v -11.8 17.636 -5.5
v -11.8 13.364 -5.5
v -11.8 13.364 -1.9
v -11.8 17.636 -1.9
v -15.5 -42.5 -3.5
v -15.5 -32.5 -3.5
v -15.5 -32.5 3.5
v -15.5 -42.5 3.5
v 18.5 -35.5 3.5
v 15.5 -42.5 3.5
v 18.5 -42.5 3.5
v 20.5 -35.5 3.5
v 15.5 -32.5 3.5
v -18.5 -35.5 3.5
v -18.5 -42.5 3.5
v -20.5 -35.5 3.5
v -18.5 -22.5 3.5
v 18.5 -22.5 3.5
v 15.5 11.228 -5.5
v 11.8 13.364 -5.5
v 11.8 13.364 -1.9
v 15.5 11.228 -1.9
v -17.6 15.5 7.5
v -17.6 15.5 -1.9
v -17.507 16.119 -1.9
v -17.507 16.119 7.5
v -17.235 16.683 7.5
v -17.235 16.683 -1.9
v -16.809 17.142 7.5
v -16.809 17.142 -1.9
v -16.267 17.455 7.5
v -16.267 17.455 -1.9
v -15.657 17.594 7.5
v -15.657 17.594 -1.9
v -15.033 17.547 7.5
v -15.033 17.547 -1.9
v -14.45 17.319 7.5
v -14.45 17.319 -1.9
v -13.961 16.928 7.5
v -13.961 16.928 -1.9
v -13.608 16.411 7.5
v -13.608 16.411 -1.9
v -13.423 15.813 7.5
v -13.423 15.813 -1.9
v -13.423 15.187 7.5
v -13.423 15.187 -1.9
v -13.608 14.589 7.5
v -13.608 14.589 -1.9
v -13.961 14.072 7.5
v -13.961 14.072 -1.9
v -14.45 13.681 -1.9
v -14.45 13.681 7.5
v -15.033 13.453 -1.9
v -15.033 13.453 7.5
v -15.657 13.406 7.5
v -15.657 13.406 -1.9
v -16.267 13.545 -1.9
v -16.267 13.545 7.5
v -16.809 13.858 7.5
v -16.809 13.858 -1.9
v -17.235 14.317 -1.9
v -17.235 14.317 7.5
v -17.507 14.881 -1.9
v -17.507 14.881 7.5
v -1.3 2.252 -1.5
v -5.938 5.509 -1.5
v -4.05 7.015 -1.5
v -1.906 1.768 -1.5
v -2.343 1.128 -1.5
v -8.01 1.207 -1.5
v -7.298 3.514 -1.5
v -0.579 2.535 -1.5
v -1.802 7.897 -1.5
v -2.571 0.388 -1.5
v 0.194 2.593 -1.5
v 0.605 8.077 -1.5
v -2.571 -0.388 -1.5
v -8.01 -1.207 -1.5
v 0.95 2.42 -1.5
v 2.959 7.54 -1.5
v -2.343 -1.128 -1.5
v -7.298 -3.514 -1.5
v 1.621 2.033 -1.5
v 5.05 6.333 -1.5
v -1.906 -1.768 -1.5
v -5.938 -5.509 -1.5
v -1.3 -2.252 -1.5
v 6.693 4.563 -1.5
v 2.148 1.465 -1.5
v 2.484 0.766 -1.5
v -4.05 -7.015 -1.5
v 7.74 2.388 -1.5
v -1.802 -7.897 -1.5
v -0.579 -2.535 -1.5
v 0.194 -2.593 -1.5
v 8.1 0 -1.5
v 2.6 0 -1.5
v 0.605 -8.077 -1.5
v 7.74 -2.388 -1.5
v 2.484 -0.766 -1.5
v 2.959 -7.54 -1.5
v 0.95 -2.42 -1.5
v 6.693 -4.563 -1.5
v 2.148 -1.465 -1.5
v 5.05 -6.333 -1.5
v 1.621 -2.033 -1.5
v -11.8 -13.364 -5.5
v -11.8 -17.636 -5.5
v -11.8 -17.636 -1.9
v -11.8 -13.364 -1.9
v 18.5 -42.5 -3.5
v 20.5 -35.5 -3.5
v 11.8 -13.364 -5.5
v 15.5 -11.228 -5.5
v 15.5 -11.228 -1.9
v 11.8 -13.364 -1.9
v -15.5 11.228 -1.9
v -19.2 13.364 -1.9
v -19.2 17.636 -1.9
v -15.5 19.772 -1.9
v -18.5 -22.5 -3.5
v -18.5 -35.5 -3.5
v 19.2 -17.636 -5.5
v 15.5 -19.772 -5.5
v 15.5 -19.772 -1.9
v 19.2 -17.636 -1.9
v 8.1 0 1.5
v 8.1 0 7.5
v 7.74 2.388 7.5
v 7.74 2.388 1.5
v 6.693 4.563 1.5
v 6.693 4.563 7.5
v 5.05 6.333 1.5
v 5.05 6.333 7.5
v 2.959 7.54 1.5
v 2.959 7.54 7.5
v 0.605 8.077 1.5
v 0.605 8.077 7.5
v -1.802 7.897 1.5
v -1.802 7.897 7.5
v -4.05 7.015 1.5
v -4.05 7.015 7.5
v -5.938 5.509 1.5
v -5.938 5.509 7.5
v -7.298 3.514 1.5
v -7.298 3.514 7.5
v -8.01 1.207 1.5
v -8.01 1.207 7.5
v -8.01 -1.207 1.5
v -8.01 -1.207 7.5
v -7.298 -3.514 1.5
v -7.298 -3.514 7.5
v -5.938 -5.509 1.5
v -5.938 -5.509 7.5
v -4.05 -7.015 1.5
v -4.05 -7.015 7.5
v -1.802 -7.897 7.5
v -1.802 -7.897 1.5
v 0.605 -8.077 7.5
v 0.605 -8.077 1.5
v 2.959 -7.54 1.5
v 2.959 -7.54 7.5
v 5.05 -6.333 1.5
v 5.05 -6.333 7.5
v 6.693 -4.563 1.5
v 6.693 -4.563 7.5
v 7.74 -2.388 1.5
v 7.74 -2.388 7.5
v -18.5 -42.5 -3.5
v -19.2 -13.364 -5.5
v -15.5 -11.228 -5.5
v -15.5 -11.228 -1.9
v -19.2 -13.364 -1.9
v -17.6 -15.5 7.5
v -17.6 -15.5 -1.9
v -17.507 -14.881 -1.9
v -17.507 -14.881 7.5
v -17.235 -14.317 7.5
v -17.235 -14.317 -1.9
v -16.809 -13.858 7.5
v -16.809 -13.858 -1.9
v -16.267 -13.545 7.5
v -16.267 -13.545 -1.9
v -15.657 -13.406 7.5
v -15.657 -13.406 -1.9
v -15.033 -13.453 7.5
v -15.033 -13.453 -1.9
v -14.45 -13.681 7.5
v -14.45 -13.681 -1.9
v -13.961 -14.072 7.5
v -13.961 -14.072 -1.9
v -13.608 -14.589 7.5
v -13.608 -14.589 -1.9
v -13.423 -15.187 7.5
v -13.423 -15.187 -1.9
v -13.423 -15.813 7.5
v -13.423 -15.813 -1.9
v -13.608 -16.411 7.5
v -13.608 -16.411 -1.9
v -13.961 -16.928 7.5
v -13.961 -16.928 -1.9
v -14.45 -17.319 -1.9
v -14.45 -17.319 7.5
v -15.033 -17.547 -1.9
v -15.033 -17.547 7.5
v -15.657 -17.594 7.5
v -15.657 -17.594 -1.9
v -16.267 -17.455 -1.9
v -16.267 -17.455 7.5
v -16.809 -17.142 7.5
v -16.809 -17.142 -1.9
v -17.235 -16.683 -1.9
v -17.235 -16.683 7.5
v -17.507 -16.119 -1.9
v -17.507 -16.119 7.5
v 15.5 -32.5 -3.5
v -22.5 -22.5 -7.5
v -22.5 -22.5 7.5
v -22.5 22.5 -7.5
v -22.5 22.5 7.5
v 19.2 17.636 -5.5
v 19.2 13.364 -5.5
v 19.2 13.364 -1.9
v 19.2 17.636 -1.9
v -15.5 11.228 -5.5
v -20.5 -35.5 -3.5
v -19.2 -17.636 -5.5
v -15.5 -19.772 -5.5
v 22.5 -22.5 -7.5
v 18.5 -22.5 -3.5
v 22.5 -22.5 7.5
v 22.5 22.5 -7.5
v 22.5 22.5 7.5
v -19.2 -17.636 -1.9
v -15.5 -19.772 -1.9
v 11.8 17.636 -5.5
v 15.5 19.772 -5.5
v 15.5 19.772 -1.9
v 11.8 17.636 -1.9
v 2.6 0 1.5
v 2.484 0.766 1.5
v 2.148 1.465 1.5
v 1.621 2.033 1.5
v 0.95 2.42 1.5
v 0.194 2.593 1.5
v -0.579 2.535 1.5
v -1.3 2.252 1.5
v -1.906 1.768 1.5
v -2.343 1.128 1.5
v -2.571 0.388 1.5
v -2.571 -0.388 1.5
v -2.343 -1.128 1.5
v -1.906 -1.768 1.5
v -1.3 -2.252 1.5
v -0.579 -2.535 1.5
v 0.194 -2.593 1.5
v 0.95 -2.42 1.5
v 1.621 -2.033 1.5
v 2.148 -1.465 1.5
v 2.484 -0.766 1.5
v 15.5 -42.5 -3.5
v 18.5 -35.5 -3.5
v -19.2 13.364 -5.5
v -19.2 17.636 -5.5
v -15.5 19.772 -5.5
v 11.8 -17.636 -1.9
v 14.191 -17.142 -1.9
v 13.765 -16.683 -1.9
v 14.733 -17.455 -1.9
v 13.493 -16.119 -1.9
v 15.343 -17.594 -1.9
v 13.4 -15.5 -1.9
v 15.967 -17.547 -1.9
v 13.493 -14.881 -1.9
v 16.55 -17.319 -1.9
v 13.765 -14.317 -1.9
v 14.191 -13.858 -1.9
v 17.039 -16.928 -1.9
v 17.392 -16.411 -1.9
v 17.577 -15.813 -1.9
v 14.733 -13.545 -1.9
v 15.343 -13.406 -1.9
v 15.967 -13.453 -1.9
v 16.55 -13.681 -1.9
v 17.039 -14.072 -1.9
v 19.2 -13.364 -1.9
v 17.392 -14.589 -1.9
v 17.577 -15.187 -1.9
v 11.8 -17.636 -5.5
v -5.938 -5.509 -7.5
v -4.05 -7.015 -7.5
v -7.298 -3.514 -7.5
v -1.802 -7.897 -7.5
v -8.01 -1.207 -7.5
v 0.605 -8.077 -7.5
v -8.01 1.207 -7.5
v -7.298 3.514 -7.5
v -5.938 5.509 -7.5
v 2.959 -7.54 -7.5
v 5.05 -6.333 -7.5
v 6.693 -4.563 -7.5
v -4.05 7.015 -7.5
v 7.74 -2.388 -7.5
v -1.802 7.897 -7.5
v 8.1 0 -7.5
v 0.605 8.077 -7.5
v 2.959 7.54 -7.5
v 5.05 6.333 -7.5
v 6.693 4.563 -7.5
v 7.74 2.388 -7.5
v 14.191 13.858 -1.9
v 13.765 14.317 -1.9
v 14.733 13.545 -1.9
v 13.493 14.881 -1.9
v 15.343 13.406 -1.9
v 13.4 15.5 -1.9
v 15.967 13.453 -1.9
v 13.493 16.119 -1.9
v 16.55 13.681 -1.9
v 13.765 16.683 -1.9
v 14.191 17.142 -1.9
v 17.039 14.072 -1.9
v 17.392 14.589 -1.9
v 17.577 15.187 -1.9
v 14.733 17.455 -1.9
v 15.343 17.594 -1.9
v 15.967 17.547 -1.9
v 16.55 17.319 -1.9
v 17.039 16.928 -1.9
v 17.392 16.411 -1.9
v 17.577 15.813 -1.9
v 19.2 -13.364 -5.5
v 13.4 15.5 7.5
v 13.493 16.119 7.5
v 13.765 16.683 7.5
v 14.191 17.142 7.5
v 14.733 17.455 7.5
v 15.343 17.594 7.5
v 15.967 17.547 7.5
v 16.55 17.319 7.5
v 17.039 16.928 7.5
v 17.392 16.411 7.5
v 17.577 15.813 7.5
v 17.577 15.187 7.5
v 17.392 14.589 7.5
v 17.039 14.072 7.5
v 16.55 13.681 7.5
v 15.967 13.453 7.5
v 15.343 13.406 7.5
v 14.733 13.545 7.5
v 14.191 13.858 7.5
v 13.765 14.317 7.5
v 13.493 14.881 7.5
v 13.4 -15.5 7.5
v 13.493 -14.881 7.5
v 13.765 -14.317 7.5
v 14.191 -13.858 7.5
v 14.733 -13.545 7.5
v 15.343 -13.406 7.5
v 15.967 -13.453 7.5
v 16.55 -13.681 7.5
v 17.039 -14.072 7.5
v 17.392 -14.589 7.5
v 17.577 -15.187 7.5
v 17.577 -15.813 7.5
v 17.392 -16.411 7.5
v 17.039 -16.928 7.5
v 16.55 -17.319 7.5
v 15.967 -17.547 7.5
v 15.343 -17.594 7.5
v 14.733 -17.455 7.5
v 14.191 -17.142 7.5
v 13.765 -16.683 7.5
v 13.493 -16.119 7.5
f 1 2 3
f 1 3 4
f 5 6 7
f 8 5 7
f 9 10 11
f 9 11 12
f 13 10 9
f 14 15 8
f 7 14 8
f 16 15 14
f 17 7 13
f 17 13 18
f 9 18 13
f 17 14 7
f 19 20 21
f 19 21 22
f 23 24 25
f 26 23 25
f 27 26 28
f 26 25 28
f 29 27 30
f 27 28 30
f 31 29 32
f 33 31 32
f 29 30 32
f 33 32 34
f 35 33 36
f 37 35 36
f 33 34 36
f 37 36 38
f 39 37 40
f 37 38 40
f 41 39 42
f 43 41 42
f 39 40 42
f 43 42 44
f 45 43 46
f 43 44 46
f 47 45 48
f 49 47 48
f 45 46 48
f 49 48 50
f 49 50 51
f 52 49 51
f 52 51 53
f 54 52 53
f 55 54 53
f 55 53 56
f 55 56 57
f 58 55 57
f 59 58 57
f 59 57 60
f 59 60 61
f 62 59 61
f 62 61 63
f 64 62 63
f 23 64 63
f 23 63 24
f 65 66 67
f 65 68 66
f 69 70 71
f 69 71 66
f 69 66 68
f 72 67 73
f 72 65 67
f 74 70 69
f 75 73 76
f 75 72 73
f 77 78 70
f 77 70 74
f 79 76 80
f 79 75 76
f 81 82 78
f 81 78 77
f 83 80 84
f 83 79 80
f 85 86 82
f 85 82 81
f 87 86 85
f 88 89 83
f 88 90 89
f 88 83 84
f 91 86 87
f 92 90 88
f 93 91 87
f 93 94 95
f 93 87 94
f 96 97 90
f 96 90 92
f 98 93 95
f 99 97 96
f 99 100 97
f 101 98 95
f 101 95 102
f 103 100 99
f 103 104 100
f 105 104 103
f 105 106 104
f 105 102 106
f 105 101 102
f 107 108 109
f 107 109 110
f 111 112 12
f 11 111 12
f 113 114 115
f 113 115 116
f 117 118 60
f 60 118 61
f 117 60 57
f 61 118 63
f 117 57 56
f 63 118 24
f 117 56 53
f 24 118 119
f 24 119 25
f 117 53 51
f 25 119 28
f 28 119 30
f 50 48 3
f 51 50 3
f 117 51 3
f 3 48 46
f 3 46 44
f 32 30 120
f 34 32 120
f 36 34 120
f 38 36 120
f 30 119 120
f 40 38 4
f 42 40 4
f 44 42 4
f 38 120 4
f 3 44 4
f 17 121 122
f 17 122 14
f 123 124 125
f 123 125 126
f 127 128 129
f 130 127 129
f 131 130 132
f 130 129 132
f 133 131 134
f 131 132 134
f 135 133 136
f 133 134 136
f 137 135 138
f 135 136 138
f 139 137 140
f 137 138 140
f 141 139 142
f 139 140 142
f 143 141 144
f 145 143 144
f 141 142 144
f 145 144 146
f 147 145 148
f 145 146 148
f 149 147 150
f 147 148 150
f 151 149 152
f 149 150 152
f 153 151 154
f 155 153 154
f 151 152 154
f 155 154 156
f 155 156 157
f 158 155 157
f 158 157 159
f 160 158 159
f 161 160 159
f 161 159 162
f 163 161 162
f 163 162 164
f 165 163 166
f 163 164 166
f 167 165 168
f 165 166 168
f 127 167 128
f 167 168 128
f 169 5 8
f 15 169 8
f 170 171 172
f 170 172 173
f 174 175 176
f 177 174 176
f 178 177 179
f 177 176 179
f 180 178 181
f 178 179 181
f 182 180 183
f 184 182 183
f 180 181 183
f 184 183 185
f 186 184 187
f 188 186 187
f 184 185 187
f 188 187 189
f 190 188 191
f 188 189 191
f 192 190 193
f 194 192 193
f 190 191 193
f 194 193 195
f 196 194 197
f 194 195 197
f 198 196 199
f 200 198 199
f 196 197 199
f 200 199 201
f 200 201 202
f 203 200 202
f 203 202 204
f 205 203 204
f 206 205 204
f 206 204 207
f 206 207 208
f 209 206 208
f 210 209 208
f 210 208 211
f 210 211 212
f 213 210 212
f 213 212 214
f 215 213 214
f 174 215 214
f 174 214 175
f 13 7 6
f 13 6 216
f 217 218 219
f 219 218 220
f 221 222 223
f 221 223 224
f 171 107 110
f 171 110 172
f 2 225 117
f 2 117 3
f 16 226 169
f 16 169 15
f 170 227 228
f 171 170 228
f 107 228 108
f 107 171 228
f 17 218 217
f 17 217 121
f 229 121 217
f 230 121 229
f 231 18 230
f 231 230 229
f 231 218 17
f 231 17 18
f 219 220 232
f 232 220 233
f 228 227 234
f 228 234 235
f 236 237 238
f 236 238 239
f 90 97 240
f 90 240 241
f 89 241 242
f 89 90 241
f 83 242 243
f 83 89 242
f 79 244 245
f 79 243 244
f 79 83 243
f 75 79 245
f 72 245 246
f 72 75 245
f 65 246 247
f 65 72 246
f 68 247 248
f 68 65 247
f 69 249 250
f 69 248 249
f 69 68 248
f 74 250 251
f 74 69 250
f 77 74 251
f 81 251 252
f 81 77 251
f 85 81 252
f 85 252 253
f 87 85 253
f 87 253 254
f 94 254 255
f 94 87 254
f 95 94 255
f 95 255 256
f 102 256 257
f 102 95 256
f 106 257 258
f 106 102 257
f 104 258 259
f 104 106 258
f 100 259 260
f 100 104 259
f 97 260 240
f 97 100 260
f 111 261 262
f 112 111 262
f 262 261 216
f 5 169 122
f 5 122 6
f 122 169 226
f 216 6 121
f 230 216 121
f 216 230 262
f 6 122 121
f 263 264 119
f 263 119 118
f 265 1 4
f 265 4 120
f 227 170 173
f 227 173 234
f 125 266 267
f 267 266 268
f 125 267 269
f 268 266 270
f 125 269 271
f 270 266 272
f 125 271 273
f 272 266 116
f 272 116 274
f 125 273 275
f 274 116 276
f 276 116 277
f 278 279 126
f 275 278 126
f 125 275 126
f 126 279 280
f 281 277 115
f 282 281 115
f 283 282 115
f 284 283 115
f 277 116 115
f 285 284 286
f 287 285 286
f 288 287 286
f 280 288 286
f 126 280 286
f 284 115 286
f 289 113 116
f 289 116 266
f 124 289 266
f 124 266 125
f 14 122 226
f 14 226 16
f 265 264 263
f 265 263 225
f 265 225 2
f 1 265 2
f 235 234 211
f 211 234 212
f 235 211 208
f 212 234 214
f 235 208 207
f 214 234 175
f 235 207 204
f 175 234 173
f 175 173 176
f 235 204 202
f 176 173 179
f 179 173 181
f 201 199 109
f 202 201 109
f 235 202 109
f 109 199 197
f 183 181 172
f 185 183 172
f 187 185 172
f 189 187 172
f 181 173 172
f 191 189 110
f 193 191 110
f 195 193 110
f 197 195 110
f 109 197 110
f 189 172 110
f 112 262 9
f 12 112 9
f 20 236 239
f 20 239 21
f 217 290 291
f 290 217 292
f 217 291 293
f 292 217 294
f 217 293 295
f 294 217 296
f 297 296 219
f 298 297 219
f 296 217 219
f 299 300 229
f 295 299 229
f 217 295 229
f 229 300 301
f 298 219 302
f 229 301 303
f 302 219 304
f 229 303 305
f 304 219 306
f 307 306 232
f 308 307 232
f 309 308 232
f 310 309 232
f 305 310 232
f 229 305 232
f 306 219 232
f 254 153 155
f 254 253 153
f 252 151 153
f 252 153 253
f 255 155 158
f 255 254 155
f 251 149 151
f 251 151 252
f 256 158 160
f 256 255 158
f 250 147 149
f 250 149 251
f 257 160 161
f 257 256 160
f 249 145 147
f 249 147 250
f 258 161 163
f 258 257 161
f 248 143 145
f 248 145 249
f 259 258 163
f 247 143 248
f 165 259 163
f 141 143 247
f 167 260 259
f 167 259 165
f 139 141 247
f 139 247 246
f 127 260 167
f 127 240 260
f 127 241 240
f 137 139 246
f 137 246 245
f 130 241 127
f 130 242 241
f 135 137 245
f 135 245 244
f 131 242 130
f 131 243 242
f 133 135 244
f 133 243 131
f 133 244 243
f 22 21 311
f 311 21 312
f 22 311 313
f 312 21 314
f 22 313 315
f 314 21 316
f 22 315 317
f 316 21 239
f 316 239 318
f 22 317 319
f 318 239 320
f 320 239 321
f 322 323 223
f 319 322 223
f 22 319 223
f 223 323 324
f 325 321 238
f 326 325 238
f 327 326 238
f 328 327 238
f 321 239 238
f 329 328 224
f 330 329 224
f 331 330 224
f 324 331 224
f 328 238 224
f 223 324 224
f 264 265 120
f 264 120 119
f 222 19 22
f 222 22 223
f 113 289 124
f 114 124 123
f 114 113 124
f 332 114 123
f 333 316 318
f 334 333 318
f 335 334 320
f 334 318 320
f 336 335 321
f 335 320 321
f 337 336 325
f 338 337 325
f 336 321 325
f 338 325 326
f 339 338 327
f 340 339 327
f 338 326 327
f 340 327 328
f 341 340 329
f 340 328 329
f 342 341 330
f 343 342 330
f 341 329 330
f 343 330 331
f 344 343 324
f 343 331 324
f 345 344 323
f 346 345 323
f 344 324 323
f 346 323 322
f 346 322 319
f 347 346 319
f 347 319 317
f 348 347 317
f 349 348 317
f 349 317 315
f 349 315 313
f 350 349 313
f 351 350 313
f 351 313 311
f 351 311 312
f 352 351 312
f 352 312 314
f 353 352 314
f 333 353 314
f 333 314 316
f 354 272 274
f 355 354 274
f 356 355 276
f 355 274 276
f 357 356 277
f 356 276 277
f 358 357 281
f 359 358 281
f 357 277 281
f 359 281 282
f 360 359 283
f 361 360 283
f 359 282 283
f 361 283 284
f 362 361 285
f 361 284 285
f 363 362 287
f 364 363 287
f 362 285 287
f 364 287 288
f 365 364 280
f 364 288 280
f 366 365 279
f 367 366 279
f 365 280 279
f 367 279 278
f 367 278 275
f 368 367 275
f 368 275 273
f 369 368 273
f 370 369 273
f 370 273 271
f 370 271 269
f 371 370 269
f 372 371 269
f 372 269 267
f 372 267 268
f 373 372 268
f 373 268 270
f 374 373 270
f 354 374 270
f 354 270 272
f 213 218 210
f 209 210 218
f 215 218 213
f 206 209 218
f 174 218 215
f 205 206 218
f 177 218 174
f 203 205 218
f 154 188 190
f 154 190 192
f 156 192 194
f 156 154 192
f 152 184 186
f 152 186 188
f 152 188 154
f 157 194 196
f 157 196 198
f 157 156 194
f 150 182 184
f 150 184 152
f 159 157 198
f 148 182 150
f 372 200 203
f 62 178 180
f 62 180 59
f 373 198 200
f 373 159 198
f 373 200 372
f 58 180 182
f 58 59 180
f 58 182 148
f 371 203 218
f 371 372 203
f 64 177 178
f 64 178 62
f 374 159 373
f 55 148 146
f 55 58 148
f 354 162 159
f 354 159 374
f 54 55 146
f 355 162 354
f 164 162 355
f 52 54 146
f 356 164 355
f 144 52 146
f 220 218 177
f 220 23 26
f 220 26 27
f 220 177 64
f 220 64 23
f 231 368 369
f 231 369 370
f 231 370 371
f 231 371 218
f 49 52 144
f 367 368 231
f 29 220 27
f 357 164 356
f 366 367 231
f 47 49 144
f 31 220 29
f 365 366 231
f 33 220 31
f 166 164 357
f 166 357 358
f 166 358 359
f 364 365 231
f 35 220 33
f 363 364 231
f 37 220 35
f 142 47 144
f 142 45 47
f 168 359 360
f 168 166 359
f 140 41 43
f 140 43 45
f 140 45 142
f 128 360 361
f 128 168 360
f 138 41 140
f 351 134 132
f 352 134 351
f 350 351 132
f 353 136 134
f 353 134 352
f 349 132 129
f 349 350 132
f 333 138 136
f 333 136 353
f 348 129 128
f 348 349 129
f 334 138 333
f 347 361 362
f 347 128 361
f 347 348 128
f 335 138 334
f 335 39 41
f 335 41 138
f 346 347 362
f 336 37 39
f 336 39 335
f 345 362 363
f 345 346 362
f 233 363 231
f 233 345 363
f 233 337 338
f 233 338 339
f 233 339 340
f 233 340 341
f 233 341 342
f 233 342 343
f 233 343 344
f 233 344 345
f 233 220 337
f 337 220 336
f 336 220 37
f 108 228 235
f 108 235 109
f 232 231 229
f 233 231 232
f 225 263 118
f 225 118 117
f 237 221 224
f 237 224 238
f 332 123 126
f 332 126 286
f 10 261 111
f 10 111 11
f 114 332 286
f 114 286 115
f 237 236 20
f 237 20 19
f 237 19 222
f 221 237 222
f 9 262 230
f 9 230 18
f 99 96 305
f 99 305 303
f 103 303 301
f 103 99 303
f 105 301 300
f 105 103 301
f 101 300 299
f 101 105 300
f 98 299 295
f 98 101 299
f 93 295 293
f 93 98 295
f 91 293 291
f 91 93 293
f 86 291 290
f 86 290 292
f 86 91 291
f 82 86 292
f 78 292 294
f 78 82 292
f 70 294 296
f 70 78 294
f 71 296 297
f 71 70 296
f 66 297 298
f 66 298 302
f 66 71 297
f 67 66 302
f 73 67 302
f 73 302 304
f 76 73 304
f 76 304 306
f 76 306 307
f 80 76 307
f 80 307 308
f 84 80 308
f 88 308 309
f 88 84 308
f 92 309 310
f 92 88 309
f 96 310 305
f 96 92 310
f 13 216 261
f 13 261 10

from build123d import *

# Parameters (mm, degrees)
SKETCH1_W           = 45
SKETCH1_H           = 45
SKETCH1_R           = 2.6
BOSS_EXTRUDE1_DEPTH = 7.5
SKETCH2_R           = 8.1
CUT_EXTRUDE1_DEPTH  = 6
CUT_EXTRUDE4_START  = -6
SKETCH5_R           = 8.1
CUT_EXTRUDE4_DEPTH  = 6
SKETCH7_W           = 37
SKETCH7_H           = 7
BOSS_EXTRUDE2_DEPTH = 10
CUT_EXTRUDE6_START  = 2
CUT_EXTRUDE6_DEPTH  = 3.6
CUT_EXTRUDE7_START  = -2
SKETCH8_R           = 2.1
CUT_EXTRUDE7_DEPTH  = 41.278836313
SKETCH9_W           = 3
SKETCH9_H           = 7
BOSS_EXTRUDE3_DEPTH = 10
SKETCH10_W          = 7
SKETCH10_H          = 7
BOSS_EXTRUDE4_DEPTH = 2
CHAMFER2_SIZE2      = 7
CHAMFER2_SIZE       = 2
CHAMFER3_SIZE2      = 7
CHAMFER3_SIZE       = 2


with BuildPart() as part:
    # Sketch1 → Boss-Extrude1 (new, symmetric)
    with BuildSketch(Plane.XY):
        Rectangle(SKETCH1_W, SKETCH1_H)
        Circle(SKETCH1_R, mode=Mode.SUBTRACT)
    extrude(amount=BOSS_EXTRUDE1_DEPTH, both=True)

    # Sketch2 → Cut-Extrude1 (cut)
    with BuildSketch(Plane.XY.offset(7.5)):
        Circle(SKETCH2_R)
    extrude(amount=-CUT_EXTRUDE1_DEPTH, mode=Mode.SUBTRACT)

    # Sketch5 → Cut-Extrude4 (cut)
    with BuildSketch(Plane(origin=(0, 0, -7.5), x_dir=(-1, 0, 0), z_dir=(0, 0, -1)).offset(CUT_EXTRUDE4_START)):
        with Locations(Location((0, 0, 0), (0, 0, 180))):
            Circle(SKETCH5_R)
    extrude(amount=CUT_EXTRUDE4_DEPTH, mode=Mode.SUBTRACT)

    # Sketch7 → Boss-Extrude2 (add)
    with BuildSketch(Plane.XZ.offset(22.5)):
        Rectangle(SKETCH7_W, SKETCH7_H)
    extrude(amount=BOSS_EXTRUDE2_DEPTH)

    # Sketch6 → Cut-Extrude6 (cut)
    with BuildSketch(Plane.XY.offset(-7.5).offset(CUT_EXTRUDE6_START)):
        Polygon((19.2, 17.636195996), (15.5, 19.772391992), (11.8, 17.636195996), (11.8, 13.363804004), (15.5, 11.227608008), (19.2, 13.363804004), align=None)
        Polygon((-11.8, 17.636195996), (-15.5, 19.772391992), (-19.2, 17.636195996), (-19.2, 13.363804004), (-15.5, 11.227608008), (-11.8, 13.363804004), align=None)
        Polygon((19.2, -13.363804004), (15.5, -11.227608008), (11.8, -13.363804004), (11.8, -17.636195996), (15.5, -19.772391992), (19.2, -17.636195996), align=None)
        Polygon((-11.8, -13.363804004), (-15.5, -11.227608008), (-19.2, -13.363804004), (-19.2, -17.636195996), (-15.5, -19.772391992), (-11.8, -17.636195996), align=None)
    extrude(amount=CUT_EXTRUDE6_DEPTH, mode=Mode.SUBTRACT)

    # Sketch8 → Cut-Extrude7 (cut, through all)
    with BuildSketch(Plane(origin=(0, 0, -7.5), x_dir=(-1, 0, 0), z_dir=(0, 0, -1)).offset(CUT_EXTRUDE7_START)):
        with Locations((-15.5, 15.5)):
            Circle(SKETCH8_R)
        with Locations((15.5, 15.5)):
            Circle(SKETCH8_R)
        with Locations((15.5, -15.5)):
            Circle(SKETCH8_R)
        with Locations((-15.5, -15.5)):
            Circle(SKETCH8_R)
    extrude(amount=-CUT_EXTRUDE7_DEPTH, mode=Mode.SUBTRACT)

    # Sketch9 → Boss-Extrude3 (add)
    with BuildSketch(Plane.XZ.offset(32.5)):
        with Locations((-17, 0)):
            Rectangle(SKETCH9_W, SKETCH9_H)
        with Locations((17, 0)):
            Rectangle(SKETCH9_W, SKETCH9_H)
    extrude(amount=BOSS_EXTRUDE3_DEPTH)

    # Sketch10 → Boss-Extrude4 (add)
    with BuildSketch(Plane.ZY.offset(18.5)):
        with Locations((0, -39)):
            Rectangle(SKETCH10_W, SKETCH10_H)
    boss_extrude4 = extrude(amount=BOSS_EXTRUDE4_DEPTH)

    # Mirror1: Boss-Extrude4 across plane
    add(boss_extrude4.mirror(Plane(origin=(0, 0, 0), x_dir=(0, 0, 1), z_dir=(1, 0, 0))))

    # Chamfer2
    chamfer2_edges = [part.edges().sort_by_distance(p)[0] for p in [
        (-20.5, -42.5, 0),
    ]]
    chamfer2_side = [part.faces().sort_by_distance(p)[0] for p in [
        (-20.46, -42.5, 0),
    ]]
    chamfer(chamfer2_edges, length=CHAMFER2_SIZE - 0.0001, length2=CHAMFER2_SIZE2 - 0.0001, reference=chamfer2_side[0])  # a hair under: the kernel refuses the full size

    # Chamfer3
    chamfer3_edges = [part.edges().sort_by_distance(p)[0] for p in [
        (20.5, -42.5, 0),
    ]]
    chamfer3_side = [part.faces().sort_by_distance(p)[0] for p in [
        (20.46, -42.5, 0),
    ]]
    chamfer(chamfer3_edges, length=CHAMFER3_SIZE - 0.0001, length2=CHAMFER3_SIZE2 - 0.0001, reference=chamfer3_side[0])  # a hair under: the kernel refuses the full size


solid = part.part
